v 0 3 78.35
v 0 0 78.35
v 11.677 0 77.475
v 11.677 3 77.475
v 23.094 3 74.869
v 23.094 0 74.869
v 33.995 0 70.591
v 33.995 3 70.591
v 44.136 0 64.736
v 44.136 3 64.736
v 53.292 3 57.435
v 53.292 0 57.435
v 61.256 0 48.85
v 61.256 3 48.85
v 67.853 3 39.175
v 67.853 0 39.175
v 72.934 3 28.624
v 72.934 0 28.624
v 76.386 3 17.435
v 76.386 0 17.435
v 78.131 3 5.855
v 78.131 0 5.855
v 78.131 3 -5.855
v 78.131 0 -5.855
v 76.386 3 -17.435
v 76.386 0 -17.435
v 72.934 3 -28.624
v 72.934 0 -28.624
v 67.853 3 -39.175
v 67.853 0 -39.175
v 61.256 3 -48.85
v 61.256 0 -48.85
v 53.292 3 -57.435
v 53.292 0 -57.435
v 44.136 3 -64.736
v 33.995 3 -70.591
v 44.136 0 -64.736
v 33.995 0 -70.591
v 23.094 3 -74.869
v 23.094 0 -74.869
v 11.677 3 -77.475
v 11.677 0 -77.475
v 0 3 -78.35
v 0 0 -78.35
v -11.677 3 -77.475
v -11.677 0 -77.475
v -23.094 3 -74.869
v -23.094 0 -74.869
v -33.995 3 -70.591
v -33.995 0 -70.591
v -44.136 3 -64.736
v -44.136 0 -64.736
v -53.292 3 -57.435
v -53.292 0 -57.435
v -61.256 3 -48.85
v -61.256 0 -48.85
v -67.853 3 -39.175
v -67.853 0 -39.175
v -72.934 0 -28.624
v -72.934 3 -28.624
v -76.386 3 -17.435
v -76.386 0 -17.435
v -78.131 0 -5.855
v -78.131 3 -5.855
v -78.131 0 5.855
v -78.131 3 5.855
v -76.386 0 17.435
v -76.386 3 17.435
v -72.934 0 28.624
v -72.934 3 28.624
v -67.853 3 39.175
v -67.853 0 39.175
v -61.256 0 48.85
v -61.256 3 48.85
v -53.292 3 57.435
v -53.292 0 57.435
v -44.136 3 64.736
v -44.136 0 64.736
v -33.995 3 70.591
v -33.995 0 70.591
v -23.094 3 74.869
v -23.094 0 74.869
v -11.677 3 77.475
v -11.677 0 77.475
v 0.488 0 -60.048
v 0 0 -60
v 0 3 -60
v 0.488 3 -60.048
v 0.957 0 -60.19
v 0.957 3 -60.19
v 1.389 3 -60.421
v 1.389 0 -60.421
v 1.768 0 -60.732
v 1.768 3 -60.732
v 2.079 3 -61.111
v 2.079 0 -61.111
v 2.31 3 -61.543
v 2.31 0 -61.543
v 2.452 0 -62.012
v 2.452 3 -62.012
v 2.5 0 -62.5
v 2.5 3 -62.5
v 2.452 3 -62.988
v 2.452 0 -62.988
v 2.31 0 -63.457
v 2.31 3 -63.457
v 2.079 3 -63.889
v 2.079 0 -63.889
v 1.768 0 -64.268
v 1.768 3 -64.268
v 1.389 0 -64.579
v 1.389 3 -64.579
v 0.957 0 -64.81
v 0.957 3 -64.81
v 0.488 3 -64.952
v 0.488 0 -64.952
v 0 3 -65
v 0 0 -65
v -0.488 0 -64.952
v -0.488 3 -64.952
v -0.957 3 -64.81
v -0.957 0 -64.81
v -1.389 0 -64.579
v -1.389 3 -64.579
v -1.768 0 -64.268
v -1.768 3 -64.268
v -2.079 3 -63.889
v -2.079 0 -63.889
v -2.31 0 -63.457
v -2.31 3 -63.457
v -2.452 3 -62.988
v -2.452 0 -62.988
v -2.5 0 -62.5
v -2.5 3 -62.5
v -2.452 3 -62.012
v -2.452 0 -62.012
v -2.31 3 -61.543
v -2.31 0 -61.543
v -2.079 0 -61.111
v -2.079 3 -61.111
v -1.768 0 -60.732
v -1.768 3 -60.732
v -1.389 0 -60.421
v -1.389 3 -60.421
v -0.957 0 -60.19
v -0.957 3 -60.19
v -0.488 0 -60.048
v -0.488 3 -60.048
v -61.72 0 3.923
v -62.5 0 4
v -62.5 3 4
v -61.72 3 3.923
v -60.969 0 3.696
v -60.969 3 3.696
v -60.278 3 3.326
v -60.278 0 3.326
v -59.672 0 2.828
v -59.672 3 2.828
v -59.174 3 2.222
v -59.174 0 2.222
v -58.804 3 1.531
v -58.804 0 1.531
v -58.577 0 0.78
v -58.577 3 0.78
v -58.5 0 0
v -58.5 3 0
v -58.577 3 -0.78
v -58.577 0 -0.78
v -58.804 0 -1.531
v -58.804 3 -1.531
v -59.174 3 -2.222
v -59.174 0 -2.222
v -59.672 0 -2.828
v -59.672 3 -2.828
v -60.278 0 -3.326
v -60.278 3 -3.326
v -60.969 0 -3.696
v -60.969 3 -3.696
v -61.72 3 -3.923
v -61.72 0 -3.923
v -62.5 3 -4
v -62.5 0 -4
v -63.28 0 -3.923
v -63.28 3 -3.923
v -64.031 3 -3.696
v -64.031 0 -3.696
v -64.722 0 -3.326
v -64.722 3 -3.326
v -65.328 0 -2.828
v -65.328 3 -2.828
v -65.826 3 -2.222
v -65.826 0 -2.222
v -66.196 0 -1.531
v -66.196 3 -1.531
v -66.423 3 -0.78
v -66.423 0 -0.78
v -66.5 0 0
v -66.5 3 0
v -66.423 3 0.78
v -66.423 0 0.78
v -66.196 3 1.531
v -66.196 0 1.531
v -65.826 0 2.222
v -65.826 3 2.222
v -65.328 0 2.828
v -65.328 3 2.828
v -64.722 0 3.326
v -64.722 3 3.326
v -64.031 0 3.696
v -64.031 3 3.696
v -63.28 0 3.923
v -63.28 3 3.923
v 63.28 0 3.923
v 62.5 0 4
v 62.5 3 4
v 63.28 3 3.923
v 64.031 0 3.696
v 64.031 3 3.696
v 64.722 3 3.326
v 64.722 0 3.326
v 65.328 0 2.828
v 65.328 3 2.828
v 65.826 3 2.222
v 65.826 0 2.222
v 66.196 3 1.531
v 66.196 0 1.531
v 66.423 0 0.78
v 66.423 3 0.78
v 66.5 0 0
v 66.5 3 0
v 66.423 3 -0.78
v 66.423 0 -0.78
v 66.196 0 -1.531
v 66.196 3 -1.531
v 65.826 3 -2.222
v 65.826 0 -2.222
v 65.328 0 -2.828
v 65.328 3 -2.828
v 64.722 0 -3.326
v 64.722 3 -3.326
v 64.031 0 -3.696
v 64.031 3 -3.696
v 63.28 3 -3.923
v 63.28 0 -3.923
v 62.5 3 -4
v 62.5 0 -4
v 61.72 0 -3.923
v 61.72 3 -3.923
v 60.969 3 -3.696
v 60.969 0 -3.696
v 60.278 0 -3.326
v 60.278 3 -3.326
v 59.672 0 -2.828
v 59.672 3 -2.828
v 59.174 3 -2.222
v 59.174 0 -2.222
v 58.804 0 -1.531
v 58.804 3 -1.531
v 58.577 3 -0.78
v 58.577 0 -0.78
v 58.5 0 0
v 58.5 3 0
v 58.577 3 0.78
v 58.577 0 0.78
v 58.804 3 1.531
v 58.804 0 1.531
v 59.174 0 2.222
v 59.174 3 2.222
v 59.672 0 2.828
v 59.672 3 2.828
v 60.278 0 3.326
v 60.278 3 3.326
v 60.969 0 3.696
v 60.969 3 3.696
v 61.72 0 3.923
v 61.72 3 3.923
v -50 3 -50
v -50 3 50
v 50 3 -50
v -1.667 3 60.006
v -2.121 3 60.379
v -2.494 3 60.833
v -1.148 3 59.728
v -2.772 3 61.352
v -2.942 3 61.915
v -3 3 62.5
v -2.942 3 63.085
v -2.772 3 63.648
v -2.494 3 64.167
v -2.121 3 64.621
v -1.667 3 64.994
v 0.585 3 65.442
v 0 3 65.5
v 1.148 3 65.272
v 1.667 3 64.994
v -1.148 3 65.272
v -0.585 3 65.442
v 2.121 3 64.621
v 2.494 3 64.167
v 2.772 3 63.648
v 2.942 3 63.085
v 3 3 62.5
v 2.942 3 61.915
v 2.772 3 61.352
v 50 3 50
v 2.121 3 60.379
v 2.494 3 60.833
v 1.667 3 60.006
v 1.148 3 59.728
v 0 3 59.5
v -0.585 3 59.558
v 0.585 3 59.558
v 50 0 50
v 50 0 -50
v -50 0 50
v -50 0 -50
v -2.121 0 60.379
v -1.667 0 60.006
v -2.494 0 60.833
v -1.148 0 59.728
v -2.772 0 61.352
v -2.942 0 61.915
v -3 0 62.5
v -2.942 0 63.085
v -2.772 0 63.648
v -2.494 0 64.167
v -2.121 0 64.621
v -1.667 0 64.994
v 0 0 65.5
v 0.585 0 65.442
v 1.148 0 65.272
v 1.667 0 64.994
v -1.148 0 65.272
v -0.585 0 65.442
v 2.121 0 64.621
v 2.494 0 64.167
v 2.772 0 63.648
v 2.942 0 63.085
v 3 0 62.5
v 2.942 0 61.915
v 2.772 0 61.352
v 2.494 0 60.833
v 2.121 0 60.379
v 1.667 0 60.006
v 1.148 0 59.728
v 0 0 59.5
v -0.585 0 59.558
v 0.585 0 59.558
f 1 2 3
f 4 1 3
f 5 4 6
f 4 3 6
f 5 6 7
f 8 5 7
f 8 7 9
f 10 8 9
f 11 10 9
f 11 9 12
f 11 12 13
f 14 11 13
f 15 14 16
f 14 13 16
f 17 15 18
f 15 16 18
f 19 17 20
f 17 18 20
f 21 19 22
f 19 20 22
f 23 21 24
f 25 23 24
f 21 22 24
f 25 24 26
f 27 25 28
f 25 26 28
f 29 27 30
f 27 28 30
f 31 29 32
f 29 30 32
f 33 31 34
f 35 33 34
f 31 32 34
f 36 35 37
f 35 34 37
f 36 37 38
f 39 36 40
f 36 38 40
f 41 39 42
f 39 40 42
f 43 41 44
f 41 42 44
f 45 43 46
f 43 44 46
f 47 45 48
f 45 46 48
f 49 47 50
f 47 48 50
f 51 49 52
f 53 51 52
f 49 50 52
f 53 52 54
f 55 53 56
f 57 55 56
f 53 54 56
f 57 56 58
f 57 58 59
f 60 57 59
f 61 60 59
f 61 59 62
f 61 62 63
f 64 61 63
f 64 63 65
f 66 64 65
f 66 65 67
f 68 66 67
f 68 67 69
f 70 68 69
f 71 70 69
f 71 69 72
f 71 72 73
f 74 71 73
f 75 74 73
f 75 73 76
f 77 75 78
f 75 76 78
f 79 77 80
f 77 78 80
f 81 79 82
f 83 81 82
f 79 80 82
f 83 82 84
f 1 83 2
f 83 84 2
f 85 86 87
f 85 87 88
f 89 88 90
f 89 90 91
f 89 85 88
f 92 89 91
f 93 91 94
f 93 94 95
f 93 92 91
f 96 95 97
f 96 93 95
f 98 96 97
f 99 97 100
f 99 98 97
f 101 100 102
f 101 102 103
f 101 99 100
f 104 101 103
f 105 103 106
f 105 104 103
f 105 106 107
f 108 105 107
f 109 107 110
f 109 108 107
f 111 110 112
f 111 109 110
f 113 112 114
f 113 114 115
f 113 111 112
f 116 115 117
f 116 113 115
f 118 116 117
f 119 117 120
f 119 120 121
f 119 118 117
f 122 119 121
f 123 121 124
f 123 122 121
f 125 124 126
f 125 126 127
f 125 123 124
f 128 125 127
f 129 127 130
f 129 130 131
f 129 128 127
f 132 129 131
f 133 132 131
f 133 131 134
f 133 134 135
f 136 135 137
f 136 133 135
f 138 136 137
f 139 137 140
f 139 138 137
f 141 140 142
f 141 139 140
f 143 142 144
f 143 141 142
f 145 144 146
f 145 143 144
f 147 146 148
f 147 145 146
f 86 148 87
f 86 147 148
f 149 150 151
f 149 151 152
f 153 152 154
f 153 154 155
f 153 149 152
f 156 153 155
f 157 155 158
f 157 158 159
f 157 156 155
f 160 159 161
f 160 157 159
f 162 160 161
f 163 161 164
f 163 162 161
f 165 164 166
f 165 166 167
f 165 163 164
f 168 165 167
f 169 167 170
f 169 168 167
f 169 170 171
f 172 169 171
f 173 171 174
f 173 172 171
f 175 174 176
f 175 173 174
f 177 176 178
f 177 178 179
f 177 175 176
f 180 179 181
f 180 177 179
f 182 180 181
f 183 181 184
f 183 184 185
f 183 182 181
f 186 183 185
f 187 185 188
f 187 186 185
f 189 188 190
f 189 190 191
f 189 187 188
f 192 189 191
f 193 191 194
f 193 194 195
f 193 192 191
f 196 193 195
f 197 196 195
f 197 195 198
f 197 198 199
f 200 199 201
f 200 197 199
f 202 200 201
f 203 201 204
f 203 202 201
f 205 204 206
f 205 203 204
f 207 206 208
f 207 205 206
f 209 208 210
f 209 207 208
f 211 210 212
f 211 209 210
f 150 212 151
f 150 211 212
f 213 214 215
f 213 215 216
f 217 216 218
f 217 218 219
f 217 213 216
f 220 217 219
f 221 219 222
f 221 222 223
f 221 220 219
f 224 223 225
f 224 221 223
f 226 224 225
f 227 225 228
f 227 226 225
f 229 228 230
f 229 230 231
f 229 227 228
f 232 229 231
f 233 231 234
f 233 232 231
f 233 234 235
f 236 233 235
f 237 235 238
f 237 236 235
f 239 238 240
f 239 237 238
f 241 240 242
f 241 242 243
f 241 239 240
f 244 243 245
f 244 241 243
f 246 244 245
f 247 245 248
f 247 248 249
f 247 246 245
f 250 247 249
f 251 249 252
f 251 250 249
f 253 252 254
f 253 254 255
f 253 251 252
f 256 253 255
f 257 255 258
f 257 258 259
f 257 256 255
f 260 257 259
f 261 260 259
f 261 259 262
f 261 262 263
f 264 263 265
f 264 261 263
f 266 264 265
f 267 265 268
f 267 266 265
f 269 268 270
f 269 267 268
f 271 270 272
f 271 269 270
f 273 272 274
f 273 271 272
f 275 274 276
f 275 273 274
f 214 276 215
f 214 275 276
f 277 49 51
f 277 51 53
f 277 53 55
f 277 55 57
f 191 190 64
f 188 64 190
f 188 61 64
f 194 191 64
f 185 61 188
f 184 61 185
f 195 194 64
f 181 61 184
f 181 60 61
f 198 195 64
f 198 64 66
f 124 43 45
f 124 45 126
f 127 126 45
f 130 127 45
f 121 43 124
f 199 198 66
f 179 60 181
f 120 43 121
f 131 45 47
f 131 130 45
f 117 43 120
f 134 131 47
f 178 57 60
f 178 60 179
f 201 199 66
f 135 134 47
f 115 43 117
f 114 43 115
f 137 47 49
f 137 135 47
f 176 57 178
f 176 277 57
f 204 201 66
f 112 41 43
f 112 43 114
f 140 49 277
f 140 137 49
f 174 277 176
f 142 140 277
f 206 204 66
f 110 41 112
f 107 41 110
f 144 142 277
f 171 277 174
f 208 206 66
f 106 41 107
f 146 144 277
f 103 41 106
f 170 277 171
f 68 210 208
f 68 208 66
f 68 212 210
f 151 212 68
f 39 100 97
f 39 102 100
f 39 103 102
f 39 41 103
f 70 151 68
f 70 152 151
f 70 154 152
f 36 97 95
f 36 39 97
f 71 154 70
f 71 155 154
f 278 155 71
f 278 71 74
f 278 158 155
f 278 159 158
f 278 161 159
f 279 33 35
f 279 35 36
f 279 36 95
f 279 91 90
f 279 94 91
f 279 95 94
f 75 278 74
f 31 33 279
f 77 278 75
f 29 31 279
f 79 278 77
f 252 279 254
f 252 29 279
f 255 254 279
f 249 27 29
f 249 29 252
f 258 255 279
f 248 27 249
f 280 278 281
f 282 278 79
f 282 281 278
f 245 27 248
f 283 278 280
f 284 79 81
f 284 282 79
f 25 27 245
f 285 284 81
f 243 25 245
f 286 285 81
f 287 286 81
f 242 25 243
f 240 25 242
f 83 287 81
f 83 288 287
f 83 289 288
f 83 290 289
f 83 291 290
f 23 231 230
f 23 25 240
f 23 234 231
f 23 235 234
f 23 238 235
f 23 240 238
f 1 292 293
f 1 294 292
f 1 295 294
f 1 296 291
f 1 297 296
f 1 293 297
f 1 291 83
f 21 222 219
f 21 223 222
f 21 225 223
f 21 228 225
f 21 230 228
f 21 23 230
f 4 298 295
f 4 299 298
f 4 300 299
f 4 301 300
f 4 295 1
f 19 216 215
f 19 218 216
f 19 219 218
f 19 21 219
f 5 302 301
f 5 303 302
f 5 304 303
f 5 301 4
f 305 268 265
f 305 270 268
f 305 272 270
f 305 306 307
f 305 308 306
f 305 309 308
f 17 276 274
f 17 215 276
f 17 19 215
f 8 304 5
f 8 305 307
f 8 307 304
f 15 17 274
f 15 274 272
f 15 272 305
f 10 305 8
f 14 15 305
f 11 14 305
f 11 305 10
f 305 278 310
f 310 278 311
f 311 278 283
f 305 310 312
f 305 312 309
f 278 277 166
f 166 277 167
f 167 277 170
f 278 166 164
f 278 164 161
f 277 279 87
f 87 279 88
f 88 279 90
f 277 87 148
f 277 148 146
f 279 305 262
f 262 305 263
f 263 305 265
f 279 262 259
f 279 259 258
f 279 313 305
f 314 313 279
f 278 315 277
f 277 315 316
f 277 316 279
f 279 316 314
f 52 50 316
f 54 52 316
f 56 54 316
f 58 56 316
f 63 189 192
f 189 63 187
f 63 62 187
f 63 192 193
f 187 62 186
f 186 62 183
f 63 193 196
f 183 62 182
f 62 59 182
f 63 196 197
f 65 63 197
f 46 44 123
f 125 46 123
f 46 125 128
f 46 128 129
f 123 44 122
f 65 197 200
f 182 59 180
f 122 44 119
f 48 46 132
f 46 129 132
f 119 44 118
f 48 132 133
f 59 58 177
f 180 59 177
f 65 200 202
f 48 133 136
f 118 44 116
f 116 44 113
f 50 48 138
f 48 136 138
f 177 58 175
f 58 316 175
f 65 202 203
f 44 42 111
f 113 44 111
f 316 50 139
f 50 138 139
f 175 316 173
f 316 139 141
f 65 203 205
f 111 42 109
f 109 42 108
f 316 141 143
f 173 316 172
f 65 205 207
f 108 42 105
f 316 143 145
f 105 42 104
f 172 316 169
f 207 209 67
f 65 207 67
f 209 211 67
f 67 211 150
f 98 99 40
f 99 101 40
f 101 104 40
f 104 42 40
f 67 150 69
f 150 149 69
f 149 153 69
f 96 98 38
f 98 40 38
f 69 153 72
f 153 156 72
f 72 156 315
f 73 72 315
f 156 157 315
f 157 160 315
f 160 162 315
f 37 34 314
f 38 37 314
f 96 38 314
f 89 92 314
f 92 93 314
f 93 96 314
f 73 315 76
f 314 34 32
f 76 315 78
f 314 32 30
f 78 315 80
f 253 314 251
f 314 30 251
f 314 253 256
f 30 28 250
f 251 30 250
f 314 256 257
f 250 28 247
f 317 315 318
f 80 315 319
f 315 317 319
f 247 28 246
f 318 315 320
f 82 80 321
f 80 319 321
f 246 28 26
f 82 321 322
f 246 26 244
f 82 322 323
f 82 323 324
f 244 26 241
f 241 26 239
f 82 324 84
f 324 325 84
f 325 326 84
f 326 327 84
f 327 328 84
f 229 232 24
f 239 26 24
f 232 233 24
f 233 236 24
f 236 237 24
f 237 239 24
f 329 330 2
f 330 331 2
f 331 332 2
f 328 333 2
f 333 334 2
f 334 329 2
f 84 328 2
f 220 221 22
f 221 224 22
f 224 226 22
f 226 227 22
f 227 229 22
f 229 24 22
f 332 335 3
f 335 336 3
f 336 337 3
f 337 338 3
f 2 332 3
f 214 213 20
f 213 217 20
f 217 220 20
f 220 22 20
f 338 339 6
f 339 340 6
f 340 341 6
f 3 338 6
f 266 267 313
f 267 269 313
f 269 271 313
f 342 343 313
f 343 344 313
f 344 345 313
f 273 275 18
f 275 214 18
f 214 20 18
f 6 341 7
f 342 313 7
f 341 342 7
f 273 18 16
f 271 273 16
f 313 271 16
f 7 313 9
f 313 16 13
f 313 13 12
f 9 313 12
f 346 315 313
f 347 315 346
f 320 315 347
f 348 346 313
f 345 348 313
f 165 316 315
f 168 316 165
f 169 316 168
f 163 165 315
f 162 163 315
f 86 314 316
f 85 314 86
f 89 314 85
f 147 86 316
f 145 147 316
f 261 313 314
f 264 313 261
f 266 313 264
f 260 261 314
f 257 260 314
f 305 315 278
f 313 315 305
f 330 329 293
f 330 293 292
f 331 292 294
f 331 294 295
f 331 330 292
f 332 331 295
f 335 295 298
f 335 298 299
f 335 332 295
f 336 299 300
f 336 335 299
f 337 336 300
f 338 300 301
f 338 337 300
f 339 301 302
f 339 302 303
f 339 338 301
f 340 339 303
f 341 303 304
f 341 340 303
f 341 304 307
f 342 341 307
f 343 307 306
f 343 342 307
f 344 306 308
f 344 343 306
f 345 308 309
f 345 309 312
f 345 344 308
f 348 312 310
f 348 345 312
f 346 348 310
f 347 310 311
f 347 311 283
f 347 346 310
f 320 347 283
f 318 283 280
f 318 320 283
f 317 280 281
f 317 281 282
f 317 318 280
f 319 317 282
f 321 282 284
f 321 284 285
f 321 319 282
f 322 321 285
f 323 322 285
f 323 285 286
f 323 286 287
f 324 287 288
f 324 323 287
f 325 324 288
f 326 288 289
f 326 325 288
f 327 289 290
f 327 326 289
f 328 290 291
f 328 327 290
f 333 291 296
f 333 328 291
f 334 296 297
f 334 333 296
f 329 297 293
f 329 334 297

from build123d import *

# Parameters (mm, degrees)
SKETCH1_R           = 78.35
SKETCH1_R_2         = 4
SKETCH1_R_3         = 3
SKETCH1_R_4         = 2.5
SKETCH1_W           = 100
SKETCH1_H           = 100
BOSS_EXTRUDE1_DEPTH = 3


with BuildPart() as part:
    # Sketch1 → Boss-Extrude1 (new body)
    with BuildSketch(Plane(origin=(0, 0, 0), x_dir=(1, 0, 0), z_dir=(0, 1, 0))):
        with Locations(Location((0, 0, 0), (0, 0, 270))):
            Circle(SKETCH1_R)
        with Locations(Location((-62.5, 0, 0), (0, 0, 270))):
            Circle(SKETCH1_R_2, mode=Mode.SUBTRACT)
        with Locations(Location((0, -62.5, 0), (0, 0, 270))):
            Circle(SKETCH1_R_3, mode=Mode.SUBTRACT)
        with Locations(Location((0, 62.5, 0), (0, 0, 270))):
            Circle(SKETCH1_R_4, mode=Mode.SUBTRACT)
        with Locations(Location((62.5, 0, 0), (0, 0, 270))):
            Circle(SKETCH1_R_2, mode=Mode.SUBTRACT)
        Rectangle(SKETCH1_W, SKETCH1_H, mode=Mode.SUBTRACT)
    extrude(amount=BOSS_EXTRUDE1_DEPTH)


solid = part.part
